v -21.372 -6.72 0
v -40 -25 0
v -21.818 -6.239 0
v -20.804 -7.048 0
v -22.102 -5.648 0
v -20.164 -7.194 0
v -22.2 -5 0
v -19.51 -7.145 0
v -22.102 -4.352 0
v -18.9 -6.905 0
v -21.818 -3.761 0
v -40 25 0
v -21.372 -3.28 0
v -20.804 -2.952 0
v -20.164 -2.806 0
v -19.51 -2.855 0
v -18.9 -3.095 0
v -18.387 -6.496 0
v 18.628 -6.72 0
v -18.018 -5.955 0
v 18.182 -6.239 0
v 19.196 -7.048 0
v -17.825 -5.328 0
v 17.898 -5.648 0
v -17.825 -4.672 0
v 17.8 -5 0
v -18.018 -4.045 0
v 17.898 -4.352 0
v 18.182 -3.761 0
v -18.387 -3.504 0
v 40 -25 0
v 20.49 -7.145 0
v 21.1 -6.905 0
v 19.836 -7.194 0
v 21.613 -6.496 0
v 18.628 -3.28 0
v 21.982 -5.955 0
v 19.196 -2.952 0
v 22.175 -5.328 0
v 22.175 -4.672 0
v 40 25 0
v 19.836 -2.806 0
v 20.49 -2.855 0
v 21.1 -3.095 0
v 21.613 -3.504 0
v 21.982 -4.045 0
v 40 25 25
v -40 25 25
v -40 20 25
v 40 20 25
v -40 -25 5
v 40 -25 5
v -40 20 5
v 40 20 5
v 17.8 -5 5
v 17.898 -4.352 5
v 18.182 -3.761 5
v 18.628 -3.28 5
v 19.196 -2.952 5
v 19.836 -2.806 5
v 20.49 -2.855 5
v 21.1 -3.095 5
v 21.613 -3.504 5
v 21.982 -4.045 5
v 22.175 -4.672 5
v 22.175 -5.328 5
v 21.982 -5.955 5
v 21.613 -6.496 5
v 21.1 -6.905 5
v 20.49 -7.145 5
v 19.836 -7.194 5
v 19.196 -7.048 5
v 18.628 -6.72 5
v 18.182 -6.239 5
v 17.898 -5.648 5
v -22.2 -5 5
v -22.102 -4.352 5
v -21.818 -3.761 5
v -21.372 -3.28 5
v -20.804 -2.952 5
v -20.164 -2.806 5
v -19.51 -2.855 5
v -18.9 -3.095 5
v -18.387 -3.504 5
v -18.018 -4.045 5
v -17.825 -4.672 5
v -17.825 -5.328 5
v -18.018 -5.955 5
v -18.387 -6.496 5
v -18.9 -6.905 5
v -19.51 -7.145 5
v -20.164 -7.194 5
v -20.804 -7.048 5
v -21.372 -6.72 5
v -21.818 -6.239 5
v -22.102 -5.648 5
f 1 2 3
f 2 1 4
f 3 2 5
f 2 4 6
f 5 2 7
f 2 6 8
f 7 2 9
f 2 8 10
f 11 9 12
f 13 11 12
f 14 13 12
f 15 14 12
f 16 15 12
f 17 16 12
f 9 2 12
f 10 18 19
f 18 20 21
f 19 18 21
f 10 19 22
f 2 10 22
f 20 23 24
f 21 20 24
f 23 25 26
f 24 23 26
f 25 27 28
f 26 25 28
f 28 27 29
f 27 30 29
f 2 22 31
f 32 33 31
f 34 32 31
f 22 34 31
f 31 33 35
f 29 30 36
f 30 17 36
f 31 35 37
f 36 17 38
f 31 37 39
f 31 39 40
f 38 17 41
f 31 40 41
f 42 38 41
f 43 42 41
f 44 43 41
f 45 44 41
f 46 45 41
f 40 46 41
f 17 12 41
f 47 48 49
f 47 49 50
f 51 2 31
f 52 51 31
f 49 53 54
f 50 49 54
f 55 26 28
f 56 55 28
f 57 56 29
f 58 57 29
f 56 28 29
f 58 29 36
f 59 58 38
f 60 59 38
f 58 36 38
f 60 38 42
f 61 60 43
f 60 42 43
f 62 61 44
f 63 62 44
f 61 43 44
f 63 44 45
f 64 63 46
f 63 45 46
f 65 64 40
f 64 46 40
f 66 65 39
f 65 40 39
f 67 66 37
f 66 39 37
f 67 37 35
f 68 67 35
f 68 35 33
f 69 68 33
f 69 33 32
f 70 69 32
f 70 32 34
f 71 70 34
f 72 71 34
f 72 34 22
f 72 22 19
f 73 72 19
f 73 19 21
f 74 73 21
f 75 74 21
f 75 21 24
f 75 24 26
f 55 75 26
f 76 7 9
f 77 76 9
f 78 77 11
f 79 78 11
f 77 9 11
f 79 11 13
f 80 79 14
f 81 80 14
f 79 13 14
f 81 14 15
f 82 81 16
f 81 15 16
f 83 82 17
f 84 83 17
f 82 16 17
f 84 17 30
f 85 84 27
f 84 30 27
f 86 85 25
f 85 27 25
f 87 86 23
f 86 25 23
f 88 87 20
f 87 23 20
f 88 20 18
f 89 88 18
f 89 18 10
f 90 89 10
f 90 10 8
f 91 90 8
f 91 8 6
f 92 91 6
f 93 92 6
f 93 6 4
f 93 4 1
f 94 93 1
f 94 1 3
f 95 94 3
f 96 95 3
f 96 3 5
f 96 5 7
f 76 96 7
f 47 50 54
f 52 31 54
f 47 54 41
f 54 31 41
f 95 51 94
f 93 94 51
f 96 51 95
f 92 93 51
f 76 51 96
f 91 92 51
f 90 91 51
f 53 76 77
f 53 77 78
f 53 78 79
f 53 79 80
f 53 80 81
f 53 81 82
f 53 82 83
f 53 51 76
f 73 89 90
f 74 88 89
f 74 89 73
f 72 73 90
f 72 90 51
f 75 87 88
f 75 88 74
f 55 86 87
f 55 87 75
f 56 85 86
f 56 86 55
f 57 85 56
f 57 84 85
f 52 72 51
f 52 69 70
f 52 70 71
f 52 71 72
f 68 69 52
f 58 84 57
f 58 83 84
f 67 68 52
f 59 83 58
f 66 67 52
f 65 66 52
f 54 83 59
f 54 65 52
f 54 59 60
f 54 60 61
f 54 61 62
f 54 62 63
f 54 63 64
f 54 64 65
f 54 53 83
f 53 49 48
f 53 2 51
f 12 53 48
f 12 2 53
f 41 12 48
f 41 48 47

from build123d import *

# Parameters (mm, degrees)
F0_W     = 80
F0_H     = 50
F1_DEPTH = 5
F2_W     = 80
F2_H     = 5
F3_DEPTH = 20
F5_D     = 4.4


with BuildPart() as f1:
    # F0 (on Top) → F1 (new body)
    with BuildSketch(Plane.XY):
        Rectangle(F0_W, F0_H)
    extrude(amount=F1_DEPTH)

    # F2 (on face) → F3 (join)
    with BuildSketch(Plane.XY.offset(5)):
        with Locations((0, 22.5)):
            Rectangle(F2_W, F2_H)
    extrude(amount=F3_DEPTH)

    # F5 (through all)
    with Locations(Plane.XY.offset(5)):
        with Locations((-20, -5), (20, -5)):
            Hole(F5_D / 2)


solid = f1.part
